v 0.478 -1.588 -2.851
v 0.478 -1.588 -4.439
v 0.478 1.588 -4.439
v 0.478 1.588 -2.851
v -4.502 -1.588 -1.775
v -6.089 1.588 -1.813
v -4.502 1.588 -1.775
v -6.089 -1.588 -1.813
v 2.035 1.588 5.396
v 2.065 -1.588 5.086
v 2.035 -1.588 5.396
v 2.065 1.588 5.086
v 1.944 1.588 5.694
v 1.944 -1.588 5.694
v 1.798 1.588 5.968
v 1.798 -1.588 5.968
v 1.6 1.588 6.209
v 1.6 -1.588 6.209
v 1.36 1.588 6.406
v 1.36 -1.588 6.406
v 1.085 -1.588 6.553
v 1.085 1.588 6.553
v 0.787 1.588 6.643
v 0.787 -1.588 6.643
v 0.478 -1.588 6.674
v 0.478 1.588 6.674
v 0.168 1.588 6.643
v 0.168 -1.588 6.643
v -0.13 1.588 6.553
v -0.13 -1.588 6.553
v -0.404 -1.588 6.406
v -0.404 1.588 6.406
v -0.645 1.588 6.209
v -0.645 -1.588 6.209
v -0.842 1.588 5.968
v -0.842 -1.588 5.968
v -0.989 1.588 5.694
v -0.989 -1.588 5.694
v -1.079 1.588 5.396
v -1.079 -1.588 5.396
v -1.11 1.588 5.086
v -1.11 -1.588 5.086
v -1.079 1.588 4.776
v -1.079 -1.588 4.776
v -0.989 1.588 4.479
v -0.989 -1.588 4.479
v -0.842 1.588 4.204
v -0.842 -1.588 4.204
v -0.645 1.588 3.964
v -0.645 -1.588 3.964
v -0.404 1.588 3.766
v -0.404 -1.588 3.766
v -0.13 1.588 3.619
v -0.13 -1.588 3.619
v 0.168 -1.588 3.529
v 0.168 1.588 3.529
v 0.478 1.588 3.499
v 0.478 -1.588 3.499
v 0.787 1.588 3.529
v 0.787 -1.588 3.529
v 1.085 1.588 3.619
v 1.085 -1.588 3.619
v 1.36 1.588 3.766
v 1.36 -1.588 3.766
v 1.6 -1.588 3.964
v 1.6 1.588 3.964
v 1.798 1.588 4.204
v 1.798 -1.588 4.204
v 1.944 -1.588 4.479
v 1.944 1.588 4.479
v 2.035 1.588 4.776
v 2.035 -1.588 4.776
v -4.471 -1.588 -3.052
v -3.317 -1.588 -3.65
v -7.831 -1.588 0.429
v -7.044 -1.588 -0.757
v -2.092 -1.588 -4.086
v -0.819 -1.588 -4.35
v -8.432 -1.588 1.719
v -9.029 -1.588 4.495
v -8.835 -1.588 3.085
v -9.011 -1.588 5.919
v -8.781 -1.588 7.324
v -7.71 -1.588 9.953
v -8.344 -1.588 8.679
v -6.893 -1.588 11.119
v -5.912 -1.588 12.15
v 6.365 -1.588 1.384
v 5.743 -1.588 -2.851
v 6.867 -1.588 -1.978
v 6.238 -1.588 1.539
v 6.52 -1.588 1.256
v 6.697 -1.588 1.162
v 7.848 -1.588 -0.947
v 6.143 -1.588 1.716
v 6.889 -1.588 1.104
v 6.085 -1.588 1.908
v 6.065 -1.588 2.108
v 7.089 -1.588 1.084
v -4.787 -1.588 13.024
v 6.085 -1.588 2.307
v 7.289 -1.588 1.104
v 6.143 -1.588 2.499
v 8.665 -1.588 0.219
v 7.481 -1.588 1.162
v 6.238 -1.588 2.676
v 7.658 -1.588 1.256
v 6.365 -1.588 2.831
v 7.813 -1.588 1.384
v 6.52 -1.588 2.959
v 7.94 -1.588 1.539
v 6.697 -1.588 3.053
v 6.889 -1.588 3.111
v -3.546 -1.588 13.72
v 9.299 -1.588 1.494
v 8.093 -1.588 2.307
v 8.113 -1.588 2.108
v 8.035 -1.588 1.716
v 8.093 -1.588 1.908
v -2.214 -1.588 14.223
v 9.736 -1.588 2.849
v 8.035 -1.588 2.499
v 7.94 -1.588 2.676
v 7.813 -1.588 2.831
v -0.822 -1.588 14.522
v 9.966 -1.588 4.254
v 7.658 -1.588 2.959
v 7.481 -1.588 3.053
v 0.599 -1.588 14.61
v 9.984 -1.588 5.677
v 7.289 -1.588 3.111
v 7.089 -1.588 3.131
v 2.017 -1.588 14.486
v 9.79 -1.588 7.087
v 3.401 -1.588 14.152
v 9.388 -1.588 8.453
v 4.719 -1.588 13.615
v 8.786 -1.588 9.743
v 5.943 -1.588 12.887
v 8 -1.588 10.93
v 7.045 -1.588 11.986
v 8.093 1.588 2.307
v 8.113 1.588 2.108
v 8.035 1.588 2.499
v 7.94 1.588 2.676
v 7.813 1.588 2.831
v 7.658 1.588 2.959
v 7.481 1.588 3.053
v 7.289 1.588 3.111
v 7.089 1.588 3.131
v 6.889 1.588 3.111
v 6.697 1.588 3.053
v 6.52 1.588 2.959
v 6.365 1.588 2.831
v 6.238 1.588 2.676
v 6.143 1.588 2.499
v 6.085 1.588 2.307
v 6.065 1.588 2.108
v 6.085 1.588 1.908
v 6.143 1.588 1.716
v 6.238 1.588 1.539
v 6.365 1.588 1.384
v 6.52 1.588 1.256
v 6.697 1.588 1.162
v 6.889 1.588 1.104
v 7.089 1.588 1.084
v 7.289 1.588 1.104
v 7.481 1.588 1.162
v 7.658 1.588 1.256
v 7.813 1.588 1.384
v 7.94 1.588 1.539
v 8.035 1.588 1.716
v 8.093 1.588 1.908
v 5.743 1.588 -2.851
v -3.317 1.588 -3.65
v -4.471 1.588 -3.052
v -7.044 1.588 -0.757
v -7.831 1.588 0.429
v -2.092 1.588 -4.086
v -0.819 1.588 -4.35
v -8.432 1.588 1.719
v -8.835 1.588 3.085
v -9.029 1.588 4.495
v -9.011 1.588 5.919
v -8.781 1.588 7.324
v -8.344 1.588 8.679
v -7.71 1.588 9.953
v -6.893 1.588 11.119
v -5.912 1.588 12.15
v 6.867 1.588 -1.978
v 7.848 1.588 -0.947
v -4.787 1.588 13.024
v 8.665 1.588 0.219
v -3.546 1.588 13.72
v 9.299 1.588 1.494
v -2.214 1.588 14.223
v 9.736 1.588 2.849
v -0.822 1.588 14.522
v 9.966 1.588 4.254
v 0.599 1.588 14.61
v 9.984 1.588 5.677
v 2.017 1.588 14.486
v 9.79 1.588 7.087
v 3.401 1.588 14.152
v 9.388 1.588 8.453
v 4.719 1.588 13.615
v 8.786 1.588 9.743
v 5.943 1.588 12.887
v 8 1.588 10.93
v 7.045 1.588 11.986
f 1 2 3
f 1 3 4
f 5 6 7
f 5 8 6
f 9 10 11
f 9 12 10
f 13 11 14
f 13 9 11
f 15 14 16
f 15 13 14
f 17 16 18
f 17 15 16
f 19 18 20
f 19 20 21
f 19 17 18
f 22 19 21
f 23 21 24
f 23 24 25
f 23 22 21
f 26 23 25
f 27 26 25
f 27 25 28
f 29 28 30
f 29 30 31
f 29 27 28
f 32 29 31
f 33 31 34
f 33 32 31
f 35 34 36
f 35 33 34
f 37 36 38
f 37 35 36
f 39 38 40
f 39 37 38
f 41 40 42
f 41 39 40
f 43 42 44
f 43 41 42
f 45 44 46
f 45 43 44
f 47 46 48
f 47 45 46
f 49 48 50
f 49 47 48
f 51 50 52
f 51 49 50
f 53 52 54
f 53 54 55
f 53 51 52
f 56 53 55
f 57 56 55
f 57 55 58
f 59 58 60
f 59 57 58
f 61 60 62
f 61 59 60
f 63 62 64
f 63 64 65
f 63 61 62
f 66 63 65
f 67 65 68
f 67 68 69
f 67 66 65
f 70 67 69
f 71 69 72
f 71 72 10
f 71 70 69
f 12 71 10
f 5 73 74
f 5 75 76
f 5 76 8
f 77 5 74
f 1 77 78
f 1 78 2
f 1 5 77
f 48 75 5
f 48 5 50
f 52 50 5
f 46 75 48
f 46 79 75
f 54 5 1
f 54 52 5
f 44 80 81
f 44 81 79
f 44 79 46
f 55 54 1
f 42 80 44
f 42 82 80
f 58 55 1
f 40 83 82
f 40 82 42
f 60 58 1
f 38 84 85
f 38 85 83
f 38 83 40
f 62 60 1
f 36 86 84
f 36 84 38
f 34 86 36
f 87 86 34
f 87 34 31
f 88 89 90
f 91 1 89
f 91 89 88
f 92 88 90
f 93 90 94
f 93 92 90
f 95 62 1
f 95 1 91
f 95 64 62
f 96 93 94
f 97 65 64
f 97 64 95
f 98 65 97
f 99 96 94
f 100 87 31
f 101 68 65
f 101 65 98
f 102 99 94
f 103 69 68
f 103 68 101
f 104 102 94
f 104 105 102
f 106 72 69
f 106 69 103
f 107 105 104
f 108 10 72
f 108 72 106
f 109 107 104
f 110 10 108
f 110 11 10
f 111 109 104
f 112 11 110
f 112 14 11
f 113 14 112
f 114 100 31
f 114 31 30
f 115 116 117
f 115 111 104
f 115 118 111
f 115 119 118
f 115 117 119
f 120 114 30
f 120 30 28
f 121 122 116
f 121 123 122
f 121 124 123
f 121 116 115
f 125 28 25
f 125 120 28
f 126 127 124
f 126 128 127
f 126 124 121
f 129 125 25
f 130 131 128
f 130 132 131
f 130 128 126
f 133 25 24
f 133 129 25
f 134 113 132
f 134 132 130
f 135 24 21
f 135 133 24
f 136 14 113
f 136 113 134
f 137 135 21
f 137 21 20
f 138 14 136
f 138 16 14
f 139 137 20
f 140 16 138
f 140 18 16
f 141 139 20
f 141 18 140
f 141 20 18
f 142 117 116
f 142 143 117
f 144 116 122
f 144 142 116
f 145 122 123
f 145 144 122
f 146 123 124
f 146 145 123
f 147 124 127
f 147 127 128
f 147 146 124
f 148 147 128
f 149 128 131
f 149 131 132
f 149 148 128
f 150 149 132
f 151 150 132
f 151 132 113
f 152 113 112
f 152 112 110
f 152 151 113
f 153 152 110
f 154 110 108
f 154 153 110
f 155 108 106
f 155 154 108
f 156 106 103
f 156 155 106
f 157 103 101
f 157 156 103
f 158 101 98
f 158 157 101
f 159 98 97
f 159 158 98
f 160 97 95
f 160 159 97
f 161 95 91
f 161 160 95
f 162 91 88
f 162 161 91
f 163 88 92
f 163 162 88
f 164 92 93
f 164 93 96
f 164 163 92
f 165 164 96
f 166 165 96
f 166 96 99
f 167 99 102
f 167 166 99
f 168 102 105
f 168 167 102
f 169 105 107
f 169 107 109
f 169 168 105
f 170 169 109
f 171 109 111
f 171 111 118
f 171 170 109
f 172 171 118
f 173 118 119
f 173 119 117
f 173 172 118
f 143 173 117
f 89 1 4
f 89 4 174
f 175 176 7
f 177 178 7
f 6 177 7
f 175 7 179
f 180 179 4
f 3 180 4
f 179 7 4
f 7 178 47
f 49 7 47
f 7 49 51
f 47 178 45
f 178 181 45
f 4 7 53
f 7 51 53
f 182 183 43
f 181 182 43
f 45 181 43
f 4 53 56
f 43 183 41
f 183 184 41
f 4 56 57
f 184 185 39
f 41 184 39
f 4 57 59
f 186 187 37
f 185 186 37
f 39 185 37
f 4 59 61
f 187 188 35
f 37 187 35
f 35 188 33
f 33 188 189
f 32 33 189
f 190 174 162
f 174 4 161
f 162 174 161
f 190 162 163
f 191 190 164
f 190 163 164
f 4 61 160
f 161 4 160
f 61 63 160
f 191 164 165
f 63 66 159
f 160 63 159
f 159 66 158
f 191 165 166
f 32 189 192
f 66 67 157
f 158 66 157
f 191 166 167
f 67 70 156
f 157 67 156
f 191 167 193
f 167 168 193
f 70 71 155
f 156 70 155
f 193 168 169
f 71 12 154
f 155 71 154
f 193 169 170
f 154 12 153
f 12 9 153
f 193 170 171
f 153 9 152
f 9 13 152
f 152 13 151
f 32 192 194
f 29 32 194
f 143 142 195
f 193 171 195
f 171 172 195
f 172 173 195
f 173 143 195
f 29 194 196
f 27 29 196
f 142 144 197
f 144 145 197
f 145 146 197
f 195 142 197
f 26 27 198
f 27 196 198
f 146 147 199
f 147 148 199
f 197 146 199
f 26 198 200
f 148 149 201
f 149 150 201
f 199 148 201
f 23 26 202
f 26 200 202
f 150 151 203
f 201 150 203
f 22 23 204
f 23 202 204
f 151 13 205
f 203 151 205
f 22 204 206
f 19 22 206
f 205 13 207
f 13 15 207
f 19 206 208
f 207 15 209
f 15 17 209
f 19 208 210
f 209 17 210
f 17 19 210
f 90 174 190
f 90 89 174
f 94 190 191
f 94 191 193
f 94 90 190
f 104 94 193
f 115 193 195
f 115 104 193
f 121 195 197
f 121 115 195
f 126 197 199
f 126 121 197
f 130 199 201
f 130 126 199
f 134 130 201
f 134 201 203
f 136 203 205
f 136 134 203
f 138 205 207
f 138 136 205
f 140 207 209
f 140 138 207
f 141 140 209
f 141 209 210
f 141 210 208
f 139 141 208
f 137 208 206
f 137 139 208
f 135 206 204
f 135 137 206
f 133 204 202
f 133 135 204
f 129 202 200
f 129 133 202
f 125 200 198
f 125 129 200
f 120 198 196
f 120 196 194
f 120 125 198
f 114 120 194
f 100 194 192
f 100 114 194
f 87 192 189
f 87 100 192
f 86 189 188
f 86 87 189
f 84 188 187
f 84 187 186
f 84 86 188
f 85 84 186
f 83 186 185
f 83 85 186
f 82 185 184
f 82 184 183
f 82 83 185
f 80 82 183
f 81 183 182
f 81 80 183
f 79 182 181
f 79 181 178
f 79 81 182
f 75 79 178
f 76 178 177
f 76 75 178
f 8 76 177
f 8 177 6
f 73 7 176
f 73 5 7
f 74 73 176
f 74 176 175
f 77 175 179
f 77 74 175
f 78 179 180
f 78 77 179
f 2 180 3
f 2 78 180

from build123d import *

# Parameters (mm, degrees)
F0_R     = 1.02362
F0_R_2   = 1.5875
F1_DEPTH = 1.5875


with BuildPart() as f1:
    # F0 (on Front) → F1 (new body, symmetric)
    with BuildSketch(Plane.XZ):
        with BuildLine():
            Line((-4.501804, -1.775407), (-4.471419, -3.052185))
            ThreePointArc((-4.471419, -3.052185), (-2.092182, -4.085642), (0.47765, -4.438859))
            Line((0.47765, -4.438859), (0.47765, -2.851359))
            Line((0.47765, -2.851359), (5.742792, -2.851359))
            ThreePointArc((5.742792, -2.851359), (1.310194, 14.574686), (-6.089304, -1.813188))
            Line((-6.089304, -1.813188), (-4.501804, -1.775407))
        make_face()
        with Locations((7.089037, 2.107543)):
            Circle(F0_R, mode=Mode.SUBTRACT)
        with Locations((0.47765, 5.086141)):
            Circle(F0_R_2, mode=Mode.SUBTRACT)
    extrude(amount=F1_DEPTH, both=True)


solid = f1.part
